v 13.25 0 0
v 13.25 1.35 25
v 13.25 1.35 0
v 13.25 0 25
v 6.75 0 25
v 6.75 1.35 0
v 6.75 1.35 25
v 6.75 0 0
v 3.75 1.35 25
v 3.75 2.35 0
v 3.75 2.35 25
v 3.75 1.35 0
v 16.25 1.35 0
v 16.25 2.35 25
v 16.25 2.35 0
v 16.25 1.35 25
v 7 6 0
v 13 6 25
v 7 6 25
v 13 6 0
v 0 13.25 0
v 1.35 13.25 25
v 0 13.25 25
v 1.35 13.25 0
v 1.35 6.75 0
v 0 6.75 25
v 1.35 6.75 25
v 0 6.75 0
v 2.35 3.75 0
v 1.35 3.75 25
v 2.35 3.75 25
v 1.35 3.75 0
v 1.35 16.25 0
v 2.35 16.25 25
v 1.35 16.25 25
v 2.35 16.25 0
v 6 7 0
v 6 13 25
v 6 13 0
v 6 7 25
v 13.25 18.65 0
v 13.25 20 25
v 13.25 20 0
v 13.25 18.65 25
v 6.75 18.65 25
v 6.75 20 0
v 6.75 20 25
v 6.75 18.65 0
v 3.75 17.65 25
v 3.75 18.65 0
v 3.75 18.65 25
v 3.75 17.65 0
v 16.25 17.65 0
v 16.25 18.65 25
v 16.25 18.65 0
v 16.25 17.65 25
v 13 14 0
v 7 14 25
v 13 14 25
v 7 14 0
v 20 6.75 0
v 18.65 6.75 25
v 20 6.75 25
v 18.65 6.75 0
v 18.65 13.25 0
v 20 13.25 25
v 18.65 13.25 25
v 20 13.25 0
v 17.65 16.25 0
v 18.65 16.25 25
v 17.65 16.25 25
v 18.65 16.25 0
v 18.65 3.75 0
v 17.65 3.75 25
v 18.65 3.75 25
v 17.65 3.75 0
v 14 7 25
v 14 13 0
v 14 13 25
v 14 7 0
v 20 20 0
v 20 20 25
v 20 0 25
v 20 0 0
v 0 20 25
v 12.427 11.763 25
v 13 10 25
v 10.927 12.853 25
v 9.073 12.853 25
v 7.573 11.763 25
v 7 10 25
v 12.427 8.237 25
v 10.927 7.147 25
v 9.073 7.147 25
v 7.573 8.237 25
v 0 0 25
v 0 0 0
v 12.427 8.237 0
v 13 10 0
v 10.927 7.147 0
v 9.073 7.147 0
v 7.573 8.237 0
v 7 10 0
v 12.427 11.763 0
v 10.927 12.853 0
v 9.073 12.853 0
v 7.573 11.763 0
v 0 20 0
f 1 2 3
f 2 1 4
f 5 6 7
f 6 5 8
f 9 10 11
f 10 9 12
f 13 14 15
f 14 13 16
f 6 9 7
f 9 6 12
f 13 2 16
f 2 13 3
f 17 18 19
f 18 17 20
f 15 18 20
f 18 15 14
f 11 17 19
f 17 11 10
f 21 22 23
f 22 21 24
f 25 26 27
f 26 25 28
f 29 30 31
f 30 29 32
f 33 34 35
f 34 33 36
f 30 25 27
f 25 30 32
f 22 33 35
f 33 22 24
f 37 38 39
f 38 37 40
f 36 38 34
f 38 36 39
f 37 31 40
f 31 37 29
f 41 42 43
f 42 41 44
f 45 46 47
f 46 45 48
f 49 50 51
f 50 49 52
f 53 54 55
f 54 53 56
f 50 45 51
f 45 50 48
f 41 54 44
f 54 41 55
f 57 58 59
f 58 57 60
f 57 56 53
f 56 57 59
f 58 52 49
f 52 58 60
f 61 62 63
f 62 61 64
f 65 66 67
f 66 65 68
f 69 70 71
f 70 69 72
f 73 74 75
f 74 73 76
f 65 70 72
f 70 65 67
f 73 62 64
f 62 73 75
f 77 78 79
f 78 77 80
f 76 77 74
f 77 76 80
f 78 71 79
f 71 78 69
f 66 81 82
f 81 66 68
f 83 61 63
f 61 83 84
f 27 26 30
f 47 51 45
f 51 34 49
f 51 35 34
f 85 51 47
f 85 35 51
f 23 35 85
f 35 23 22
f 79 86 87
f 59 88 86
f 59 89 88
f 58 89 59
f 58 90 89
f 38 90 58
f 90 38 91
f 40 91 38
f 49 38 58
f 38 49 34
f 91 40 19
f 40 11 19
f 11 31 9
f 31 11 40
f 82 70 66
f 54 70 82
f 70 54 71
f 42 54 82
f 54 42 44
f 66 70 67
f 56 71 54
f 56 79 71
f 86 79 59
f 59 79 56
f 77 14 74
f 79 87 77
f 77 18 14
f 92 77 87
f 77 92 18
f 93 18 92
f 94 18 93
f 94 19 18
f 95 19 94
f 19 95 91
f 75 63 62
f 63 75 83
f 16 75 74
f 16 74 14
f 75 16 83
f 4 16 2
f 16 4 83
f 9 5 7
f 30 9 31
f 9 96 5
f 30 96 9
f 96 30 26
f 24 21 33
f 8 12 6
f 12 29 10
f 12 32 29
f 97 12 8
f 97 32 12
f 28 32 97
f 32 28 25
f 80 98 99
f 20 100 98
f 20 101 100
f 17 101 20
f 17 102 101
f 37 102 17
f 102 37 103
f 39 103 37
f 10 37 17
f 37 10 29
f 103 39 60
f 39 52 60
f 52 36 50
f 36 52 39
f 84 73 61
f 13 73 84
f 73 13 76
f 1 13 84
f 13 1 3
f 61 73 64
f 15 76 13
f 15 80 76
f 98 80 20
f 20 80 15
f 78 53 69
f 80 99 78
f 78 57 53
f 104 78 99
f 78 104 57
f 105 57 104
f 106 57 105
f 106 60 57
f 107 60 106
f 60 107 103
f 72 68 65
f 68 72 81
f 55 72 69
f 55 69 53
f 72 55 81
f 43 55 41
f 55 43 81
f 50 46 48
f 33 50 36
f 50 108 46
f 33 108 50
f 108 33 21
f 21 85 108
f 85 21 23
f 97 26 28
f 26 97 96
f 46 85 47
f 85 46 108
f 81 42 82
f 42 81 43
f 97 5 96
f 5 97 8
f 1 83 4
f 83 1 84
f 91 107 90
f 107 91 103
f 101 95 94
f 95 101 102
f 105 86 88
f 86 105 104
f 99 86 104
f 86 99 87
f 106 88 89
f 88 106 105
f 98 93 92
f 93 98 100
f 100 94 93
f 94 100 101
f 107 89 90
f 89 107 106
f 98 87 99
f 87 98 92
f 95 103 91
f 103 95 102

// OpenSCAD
//Specify the height
Height = 25 ; // [1:1:500]
//Specify the inner diameter
InnerDiameter = 6 ; // [5:1:6]

2020_Profile ();

module 2020_Profile() {
    color ("silver")
    difference () {
        translate ([0,0,0]) cube ([20,20,Height]);
        translate ([10,10,-1]) cylinder(d=InnerDiameter,h=Height+2);

        2020_ProfileCutOut (Height=Height);
        mirror ([1,0,0]) rotate ([0,0,90]) 2020_ProfileCutOut (Height=Height);
        translate ([0,20,0]) mirror ([0,1,0]) 2020_ProfileCutOut (Height=Height);
        translate ([20,20,0]) rotate ([0,0,-90]) mirror ([0,1,0]) 2020_ProfileCutOut (Height=Height);
    }
}
module 2020_ProfileCutOut () {    
    union () {
        translate ([10-3.25,-0.5,-1]) cube ([6.5,6,Height+2]);
        hull () {
            translate ([10-6.25,1.35,-1]) cube ([12.5,1,Height+2]);
            translate ([10-3,5,-1]) cube ([6,1,Height+2]);
        }
    }
}
